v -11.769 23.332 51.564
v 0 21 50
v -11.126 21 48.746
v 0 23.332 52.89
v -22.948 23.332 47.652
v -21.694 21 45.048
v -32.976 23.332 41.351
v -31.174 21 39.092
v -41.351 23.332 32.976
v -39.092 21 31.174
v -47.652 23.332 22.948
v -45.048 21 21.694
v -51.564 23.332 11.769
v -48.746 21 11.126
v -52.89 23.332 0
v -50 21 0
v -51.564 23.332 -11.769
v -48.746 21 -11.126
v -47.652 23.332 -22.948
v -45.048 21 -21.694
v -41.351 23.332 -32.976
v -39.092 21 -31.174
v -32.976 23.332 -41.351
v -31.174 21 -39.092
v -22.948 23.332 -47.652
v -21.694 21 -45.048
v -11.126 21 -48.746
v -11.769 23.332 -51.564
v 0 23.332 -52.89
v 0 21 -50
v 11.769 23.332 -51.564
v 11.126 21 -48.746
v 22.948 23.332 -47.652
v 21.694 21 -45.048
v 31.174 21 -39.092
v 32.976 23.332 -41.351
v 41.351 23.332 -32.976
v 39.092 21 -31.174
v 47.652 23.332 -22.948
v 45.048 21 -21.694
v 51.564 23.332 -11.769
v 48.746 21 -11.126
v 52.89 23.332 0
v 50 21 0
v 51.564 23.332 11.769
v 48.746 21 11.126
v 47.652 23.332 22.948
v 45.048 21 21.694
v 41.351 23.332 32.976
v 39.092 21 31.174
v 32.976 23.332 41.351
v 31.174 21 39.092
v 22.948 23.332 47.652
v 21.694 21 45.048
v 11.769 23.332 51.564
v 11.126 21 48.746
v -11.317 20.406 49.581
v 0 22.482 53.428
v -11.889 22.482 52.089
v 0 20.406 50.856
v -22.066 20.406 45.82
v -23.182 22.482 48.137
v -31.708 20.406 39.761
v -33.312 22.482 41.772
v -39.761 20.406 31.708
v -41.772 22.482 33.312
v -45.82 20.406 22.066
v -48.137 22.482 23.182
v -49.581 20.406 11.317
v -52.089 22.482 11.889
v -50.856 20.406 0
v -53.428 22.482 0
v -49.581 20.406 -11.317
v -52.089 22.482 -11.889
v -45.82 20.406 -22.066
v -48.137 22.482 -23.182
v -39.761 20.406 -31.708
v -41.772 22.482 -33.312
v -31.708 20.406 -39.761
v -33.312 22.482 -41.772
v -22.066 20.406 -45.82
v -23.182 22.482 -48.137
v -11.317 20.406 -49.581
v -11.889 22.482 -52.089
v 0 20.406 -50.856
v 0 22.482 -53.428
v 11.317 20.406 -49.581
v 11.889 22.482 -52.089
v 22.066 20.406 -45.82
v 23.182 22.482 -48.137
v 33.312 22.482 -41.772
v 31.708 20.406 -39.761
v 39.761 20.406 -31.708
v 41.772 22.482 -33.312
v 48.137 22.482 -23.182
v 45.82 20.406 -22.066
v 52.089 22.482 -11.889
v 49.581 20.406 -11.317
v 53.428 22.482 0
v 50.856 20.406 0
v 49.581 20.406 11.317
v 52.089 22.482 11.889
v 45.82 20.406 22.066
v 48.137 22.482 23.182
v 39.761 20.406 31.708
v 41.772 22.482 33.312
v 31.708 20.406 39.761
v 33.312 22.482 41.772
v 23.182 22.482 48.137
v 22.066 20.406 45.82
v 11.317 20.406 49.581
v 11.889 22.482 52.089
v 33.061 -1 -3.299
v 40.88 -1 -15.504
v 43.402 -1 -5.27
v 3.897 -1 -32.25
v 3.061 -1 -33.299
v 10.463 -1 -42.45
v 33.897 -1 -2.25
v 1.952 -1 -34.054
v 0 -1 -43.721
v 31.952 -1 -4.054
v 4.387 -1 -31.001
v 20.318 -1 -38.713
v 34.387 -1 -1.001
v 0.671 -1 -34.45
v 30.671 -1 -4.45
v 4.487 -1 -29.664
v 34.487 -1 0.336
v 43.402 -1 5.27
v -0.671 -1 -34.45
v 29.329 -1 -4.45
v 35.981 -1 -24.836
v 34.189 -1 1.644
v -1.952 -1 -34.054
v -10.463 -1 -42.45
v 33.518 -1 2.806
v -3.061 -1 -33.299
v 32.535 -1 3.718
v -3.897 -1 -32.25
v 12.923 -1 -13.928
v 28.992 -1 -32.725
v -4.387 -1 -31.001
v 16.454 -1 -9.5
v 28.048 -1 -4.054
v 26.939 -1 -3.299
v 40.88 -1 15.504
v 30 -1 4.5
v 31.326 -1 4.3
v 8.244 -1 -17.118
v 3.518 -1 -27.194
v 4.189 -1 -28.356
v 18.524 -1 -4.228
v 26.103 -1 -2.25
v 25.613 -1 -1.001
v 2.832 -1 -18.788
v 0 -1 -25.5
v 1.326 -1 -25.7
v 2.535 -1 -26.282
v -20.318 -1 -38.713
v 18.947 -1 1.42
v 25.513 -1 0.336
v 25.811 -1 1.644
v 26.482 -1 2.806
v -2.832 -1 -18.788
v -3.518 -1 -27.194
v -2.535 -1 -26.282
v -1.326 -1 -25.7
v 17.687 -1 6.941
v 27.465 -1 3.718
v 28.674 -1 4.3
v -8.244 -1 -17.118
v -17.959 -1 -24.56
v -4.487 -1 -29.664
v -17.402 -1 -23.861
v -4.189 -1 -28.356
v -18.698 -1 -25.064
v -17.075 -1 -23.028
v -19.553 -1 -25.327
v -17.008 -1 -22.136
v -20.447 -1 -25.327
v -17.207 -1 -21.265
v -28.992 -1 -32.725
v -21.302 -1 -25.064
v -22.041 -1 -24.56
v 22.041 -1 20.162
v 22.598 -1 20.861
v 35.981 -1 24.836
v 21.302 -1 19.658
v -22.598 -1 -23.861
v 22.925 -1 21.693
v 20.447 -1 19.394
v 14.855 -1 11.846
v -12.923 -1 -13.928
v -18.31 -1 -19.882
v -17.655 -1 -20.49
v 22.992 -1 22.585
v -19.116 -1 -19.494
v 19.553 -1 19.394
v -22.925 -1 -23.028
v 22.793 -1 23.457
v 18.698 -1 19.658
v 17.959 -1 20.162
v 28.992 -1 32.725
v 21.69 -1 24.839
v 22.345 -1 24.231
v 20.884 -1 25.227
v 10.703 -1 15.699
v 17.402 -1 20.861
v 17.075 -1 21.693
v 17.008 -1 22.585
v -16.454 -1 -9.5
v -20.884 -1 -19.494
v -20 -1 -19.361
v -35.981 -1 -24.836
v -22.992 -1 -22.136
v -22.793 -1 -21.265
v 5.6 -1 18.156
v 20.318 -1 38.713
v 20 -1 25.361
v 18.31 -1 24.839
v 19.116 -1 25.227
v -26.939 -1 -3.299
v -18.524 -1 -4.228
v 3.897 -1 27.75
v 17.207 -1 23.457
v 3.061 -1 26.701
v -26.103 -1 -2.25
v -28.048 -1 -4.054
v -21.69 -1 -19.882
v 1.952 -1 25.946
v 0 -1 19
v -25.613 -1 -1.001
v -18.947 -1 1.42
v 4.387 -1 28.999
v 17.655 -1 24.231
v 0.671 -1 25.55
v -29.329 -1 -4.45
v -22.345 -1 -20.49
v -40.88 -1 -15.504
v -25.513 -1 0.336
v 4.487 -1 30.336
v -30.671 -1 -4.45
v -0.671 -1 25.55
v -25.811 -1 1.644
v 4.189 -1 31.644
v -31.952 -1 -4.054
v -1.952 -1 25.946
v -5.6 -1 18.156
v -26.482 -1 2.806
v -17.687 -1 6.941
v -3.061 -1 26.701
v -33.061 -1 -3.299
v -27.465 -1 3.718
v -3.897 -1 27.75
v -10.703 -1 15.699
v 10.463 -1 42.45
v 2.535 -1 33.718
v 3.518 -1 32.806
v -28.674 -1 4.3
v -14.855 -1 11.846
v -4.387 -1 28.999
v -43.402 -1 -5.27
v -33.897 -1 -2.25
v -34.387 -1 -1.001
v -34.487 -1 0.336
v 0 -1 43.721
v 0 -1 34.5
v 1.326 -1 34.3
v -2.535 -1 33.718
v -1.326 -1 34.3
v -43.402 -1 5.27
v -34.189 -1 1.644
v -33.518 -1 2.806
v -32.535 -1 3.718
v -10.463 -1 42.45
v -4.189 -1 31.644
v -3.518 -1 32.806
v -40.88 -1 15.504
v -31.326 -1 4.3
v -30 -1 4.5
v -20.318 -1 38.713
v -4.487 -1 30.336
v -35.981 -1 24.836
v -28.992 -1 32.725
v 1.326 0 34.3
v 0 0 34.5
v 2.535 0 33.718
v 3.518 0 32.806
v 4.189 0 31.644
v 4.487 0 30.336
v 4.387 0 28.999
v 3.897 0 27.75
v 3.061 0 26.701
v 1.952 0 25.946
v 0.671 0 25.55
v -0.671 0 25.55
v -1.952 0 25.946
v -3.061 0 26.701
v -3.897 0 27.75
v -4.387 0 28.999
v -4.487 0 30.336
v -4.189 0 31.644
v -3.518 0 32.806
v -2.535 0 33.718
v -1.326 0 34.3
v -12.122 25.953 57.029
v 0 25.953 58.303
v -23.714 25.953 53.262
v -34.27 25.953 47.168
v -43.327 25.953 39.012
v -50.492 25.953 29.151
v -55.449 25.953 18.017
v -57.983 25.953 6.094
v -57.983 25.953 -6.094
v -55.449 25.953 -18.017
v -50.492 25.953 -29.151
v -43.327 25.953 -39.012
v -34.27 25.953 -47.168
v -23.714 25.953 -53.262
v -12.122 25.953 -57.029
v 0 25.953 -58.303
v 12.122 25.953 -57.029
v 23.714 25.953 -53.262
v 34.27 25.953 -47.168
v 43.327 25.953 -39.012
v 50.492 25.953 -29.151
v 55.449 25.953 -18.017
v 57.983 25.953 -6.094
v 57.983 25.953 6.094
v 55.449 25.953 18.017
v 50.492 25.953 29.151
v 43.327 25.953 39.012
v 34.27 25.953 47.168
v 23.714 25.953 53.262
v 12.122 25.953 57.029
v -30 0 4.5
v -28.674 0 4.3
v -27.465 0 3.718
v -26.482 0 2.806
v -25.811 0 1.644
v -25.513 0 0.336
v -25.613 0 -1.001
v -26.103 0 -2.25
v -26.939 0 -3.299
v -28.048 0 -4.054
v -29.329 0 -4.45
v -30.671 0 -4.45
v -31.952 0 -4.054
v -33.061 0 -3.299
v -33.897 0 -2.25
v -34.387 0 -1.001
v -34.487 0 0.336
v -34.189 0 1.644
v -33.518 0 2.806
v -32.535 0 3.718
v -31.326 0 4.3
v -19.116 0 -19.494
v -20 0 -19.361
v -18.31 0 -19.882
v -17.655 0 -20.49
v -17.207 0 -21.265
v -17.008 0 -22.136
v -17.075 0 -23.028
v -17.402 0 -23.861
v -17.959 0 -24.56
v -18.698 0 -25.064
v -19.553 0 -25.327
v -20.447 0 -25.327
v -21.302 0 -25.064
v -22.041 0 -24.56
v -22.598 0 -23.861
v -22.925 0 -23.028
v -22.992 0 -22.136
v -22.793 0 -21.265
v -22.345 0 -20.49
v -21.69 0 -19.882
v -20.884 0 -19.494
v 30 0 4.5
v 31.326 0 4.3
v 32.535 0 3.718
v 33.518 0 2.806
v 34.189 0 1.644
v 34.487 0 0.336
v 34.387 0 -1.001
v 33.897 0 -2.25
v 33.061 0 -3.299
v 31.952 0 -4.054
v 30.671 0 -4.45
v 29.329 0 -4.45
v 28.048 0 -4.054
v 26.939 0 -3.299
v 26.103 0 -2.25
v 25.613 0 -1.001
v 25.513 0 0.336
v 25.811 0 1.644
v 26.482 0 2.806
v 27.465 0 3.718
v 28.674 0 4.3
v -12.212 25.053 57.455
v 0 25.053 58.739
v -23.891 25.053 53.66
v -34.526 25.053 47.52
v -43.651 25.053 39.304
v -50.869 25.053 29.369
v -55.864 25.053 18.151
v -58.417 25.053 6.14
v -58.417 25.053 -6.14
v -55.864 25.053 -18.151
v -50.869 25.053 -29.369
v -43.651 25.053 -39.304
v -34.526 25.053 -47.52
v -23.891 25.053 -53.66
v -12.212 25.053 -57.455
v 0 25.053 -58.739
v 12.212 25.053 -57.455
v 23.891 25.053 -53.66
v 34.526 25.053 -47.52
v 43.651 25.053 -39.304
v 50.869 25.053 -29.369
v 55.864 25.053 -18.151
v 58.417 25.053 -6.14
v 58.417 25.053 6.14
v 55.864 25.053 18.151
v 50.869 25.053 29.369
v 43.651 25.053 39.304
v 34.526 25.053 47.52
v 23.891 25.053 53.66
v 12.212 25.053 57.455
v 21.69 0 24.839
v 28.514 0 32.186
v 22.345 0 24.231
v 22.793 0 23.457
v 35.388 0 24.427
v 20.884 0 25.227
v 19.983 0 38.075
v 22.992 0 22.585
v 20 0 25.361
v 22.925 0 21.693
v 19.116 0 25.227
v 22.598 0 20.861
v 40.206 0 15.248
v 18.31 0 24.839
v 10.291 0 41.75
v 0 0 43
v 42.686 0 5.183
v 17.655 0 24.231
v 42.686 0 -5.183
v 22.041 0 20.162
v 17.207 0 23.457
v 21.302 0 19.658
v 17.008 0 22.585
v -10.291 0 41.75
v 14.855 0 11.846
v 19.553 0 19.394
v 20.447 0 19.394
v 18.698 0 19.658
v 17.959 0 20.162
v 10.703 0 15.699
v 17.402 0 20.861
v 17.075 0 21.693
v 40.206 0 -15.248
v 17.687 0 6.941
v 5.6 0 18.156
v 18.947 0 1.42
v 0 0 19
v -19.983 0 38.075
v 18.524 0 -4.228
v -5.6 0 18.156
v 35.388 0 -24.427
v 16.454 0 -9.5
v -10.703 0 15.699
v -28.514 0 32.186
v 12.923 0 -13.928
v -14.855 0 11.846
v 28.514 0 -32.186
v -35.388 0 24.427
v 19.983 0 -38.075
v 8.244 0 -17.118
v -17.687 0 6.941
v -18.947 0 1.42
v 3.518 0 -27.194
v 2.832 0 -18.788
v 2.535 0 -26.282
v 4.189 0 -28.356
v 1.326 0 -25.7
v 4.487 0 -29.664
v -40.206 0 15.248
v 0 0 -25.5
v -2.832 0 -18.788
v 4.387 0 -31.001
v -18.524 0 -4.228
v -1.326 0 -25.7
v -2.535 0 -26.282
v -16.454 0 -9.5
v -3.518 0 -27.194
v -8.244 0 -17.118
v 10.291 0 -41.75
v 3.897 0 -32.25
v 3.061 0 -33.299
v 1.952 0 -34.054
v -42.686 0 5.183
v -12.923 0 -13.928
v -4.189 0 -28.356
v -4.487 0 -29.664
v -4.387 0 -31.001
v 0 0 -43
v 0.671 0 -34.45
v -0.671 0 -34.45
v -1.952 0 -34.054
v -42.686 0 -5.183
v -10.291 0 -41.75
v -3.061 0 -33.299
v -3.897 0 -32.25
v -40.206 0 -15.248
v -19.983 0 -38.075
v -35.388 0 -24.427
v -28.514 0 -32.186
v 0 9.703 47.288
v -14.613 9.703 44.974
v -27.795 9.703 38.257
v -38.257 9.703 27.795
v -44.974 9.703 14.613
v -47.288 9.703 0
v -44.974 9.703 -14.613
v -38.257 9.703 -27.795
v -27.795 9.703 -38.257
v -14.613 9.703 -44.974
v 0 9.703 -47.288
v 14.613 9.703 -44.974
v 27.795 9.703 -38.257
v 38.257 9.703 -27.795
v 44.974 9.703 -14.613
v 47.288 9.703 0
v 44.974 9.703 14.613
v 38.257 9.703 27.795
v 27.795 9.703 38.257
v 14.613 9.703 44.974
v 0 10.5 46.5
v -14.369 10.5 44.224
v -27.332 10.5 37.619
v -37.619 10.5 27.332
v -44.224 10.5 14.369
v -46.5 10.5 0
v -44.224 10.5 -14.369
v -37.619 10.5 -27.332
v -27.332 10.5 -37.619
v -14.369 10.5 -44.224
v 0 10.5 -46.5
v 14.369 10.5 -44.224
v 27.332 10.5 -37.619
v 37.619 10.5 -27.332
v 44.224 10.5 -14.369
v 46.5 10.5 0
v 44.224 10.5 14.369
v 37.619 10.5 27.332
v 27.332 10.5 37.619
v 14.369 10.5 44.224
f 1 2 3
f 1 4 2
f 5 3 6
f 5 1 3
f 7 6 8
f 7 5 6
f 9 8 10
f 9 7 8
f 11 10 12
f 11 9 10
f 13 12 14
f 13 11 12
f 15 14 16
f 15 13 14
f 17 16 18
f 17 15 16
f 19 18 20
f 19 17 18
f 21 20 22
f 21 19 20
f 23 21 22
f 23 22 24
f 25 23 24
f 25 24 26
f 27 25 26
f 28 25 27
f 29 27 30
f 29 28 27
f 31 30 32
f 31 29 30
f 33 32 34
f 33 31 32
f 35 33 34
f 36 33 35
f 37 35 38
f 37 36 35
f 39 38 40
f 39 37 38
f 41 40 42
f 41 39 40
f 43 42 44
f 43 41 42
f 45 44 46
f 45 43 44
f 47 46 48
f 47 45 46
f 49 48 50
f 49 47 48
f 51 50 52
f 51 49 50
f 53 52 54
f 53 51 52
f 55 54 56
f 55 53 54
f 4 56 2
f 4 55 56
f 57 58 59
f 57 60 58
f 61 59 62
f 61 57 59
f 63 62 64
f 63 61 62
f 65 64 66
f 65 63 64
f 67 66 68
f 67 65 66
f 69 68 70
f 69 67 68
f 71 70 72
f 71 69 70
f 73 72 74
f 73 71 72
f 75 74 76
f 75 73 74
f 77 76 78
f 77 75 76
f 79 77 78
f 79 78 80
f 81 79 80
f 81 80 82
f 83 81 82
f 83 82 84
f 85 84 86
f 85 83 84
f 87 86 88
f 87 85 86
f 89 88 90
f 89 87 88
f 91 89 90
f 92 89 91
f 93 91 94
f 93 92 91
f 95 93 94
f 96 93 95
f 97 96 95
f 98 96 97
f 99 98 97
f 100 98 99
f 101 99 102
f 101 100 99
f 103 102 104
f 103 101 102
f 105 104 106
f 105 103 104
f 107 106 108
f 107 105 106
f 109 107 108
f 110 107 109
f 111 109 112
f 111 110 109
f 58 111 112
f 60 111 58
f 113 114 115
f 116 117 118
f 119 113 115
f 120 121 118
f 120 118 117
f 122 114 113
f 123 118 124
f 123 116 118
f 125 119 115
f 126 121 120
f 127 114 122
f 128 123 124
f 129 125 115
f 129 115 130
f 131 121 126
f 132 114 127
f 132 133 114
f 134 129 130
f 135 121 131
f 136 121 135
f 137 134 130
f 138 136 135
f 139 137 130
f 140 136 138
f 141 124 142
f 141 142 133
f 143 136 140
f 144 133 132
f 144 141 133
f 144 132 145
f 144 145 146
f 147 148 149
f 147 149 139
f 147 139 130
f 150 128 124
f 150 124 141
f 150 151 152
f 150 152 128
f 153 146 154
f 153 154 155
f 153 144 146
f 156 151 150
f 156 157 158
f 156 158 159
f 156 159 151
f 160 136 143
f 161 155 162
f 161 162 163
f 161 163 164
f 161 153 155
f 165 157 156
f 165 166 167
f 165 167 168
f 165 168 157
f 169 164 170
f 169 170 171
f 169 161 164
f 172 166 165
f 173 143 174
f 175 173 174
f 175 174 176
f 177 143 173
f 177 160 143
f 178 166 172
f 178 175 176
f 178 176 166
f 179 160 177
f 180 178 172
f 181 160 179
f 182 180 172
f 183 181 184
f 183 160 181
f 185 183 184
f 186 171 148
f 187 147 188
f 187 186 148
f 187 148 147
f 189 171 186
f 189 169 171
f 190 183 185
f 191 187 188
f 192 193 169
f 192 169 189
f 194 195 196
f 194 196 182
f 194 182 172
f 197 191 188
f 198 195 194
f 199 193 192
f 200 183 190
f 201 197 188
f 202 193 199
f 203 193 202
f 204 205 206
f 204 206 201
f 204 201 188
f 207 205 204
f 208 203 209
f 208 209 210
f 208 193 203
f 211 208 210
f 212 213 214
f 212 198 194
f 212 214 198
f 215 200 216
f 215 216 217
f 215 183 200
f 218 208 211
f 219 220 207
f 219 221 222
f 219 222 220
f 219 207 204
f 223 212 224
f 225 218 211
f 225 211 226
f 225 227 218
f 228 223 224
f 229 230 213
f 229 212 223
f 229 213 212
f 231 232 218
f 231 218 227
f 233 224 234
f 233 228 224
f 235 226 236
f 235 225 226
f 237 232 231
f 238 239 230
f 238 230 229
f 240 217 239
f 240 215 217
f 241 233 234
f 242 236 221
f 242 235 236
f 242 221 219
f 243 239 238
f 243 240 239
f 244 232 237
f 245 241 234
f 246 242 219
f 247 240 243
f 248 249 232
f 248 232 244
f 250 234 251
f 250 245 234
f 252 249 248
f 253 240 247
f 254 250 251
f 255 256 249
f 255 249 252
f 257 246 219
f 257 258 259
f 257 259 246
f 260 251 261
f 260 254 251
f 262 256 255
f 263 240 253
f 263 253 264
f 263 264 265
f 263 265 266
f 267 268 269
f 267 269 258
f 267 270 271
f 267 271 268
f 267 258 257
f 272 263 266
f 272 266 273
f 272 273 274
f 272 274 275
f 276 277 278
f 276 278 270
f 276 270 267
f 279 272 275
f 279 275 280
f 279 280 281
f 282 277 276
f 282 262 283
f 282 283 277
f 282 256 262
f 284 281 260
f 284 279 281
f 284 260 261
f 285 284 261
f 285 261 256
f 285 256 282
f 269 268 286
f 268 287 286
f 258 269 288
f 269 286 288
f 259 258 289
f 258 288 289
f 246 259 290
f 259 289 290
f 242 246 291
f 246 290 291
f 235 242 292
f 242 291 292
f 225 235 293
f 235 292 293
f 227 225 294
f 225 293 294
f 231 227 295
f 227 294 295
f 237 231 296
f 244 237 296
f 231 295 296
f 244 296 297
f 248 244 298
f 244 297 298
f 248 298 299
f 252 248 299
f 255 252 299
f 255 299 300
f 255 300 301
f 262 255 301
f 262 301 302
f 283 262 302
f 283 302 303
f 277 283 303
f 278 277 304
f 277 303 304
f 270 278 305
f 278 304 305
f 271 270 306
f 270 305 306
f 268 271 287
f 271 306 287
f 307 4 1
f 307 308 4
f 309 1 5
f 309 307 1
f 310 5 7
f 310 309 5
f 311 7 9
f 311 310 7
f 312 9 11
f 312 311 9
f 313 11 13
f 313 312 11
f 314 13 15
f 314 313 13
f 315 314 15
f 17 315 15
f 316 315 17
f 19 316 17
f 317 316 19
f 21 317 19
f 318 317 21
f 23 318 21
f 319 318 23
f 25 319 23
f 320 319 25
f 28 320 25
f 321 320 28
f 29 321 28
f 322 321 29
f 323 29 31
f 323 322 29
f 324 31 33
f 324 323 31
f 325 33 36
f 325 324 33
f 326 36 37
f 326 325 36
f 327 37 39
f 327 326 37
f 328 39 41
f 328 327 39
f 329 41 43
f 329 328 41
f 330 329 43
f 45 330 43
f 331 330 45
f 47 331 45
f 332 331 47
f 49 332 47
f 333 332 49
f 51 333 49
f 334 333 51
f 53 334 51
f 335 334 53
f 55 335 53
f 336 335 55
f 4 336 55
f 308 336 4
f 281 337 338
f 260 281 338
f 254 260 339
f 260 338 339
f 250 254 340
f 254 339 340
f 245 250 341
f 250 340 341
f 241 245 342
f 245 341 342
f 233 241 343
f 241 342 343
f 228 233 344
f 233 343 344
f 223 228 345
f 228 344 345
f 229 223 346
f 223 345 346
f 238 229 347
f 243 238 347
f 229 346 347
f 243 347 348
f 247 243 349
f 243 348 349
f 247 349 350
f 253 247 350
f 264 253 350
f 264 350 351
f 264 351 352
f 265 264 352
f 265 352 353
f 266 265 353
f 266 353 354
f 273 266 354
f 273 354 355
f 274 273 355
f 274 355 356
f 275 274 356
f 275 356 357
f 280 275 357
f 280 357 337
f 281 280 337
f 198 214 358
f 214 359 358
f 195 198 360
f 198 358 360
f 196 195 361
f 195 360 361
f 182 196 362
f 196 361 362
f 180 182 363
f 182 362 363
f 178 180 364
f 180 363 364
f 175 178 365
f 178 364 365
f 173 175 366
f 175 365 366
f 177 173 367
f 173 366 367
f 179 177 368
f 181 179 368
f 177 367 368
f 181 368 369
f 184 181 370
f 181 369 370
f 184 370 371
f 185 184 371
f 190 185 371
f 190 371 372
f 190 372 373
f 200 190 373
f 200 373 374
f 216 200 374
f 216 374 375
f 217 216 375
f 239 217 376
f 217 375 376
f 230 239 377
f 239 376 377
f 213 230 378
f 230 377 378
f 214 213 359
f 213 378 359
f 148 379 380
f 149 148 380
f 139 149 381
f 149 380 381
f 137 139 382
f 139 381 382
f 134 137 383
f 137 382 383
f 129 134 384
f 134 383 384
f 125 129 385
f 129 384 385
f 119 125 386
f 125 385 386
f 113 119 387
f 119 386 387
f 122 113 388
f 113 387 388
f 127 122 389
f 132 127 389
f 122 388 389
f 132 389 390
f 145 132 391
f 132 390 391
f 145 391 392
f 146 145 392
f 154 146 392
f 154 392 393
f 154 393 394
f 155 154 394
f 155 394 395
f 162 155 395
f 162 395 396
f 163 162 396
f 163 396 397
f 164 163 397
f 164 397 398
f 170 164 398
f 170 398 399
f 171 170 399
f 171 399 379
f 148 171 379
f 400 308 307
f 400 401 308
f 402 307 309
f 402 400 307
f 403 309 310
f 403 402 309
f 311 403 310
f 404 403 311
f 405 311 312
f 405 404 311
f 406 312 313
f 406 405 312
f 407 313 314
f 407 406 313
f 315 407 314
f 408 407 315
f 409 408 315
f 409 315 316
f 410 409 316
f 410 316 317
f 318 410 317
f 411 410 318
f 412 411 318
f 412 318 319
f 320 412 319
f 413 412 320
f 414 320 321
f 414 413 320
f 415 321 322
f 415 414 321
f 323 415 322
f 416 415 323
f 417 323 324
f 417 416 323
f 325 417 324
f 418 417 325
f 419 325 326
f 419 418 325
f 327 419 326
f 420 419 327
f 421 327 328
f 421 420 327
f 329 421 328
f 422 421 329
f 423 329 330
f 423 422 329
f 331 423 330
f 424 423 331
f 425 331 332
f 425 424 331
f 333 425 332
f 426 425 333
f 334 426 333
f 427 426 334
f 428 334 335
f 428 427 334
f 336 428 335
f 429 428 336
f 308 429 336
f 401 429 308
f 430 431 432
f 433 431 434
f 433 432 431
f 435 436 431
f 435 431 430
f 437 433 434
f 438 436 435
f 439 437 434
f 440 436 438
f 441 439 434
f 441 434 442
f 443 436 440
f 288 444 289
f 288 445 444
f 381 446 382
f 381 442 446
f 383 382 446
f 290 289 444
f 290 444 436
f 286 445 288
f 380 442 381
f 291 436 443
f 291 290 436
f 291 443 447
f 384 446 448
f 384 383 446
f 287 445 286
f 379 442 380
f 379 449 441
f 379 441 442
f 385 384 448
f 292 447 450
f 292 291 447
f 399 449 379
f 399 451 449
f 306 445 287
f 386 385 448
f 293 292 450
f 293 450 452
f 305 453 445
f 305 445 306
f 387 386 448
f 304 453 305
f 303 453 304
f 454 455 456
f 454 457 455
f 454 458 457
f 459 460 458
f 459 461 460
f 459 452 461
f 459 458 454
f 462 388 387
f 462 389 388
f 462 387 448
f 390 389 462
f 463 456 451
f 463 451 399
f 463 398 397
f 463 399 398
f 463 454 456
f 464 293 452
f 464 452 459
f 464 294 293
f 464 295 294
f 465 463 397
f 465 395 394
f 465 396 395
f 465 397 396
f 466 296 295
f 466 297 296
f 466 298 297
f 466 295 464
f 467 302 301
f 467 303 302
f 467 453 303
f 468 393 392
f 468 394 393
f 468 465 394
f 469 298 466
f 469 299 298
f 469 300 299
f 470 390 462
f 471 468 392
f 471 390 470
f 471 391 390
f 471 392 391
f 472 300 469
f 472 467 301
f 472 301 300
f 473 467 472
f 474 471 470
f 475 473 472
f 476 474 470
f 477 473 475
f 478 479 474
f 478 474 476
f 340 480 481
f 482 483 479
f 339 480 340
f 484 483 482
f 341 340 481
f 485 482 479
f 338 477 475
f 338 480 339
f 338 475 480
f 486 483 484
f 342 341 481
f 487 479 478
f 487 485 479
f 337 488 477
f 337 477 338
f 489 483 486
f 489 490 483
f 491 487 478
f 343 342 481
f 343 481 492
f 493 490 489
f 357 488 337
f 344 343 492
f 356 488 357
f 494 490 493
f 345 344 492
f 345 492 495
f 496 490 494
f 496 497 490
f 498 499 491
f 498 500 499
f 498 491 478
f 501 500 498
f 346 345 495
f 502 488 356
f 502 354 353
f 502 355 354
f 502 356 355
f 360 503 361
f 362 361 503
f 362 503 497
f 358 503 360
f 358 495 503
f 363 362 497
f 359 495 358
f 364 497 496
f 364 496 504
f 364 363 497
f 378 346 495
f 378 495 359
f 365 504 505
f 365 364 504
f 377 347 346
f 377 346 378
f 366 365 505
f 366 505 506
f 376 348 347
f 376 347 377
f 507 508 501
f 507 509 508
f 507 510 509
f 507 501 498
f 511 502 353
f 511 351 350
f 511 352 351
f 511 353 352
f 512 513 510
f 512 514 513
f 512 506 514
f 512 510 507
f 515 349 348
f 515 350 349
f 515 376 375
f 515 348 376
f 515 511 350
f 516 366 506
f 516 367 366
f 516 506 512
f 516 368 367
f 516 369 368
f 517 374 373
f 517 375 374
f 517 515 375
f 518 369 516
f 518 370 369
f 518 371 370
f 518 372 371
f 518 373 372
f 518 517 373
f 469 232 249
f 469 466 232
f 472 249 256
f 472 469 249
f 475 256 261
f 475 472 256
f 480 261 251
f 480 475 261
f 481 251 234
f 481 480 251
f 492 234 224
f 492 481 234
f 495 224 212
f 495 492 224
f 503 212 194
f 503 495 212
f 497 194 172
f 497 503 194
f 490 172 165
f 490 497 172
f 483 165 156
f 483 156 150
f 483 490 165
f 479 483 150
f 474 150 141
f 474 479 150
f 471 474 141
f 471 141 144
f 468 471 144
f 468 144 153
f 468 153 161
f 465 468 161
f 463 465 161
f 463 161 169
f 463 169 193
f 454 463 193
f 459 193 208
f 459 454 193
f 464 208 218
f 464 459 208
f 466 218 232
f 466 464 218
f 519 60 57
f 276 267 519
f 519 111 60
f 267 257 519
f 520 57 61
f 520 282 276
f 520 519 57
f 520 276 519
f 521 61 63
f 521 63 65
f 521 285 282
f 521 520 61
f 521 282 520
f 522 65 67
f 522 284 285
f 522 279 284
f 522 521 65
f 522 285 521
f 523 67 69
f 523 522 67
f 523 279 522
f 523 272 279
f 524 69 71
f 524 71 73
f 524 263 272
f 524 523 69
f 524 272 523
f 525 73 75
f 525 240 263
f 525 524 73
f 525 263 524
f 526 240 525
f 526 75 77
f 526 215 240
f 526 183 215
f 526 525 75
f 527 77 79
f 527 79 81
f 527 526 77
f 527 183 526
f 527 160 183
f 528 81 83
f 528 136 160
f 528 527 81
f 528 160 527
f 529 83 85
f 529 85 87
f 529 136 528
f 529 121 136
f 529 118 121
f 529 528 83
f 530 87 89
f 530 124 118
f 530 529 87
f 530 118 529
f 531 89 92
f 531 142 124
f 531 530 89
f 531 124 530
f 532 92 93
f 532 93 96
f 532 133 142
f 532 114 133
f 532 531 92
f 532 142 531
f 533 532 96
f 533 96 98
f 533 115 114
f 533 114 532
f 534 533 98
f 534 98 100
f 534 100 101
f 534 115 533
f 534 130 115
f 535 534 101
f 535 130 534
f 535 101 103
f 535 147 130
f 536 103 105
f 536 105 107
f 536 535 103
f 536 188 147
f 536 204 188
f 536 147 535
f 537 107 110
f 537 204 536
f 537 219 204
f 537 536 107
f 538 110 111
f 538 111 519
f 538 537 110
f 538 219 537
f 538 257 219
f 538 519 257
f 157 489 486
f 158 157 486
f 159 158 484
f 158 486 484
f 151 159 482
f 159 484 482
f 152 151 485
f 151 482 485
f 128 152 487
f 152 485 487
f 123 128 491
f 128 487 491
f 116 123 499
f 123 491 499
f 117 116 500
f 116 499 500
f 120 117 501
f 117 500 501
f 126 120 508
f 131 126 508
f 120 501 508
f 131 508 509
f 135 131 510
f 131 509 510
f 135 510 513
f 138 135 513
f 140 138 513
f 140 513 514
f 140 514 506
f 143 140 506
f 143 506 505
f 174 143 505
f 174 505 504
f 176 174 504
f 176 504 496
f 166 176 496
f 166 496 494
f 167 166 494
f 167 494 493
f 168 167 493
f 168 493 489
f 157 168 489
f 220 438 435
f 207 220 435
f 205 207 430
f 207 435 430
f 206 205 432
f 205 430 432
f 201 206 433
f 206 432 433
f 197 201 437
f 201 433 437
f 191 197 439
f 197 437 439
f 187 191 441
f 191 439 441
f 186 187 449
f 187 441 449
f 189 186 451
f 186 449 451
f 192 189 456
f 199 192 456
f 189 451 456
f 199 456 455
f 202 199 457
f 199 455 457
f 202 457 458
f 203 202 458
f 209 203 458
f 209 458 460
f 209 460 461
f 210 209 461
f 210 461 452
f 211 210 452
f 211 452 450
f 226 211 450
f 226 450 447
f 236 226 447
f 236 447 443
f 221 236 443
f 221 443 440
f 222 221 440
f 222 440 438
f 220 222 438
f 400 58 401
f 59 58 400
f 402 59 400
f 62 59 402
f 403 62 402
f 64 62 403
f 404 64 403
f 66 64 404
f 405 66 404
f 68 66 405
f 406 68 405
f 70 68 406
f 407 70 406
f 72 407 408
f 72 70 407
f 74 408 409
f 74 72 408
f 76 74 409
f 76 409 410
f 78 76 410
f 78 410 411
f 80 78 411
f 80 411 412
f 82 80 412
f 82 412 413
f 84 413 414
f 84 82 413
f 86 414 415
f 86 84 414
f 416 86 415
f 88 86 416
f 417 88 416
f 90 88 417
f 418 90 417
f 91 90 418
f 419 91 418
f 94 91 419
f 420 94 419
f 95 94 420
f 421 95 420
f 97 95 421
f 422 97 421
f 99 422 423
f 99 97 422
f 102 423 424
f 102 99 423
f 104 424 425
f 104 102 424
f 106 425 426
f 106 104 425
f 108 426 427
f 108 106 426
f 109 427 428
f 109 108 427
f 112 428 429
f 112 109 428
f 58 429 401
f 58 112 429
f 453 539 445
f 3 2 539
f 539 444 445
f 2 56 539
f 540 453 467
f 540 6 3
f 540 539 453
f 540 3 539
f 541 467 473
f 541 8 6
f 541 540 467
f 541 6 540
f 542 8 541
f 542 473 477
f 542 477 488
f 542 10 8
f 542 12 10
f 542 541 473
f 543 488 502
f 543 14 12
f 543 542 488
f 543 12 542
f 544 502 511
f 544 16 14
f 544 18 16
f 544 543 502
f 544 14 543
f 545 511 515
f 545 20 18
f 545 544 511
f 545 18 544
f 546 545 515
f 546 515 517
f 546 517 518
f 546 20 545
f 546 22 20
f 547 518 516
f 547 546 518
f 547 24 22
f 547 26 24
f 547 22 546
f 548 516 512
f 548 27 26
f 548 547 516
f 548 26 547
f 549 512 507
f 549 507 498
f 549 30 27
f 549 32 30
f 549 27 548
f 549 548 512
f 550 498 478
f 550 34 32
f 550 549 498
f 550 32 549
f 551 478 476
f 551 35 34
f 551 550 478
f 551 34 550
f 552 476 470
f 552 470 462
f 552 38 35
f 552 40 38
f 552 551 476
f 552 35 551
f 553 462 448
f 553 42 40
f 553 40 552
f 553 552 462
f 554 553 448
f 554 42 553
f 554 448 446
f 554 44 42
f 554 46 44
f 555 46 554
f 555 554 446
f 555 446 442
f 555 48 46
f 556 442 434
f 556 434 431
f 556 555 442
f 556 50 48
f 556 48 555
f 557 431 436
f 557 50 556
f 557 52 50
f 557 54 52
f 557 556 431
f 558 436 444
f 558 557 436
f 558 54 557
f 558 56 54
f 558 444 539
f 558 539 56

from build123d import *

# Parameters (mm, degrees)
SKETCH_2_R          = 4.5
CUT_EXTRUDE_1_DEPTH = 40
SKETCH_3_R          = 3
CUT_EXTRUDE_2_DEPTH = 5


with BuildPart() as part:
    # Эскиз1 → Повернуть-Тонкостенный1 (revolve)
    with BuildSketch(Plane.XY, mode=Mode.PRIVATE) as revolve_1_sk:
        Polygon((19, 0), (43, 0), (50, 21), (52.889577147, 23.332201276), (58.302767501, 25.953006302), (58.738533119, 25.052946123), (53.42847461, 22.482072549), (50.856038751, 20.405838593), (43.72075922, -1), (19, -1), align=None)
    revolve(revolve_1_sk.sketch.rotate(Axis((0, 0, 0), (0, -1, 0)), 90), axis=Axis((0, 0, 0), (0, -1, 0)))

    # Эскиз2 → Вытянуть1 (cut, symmetric)
    with BuildSketch(Plane(origin=(0, 0, 0), x_dir=(1, 0, 0), z_dir=(0, 1, 0))):
        with Locations(Location((30, 0, 0), (0, 0, 270))):
            Circle(SKETCH_2_R)
        with Locations(Location((-30, 0, 0), (0, 0, 270))):
            Circle(SKETCH_2_R)
        with Locations(Location((0, 30, 0), (0, 0, 270))):
            Circle(SKETCH_2_R)
        with Locations(Location((0, -30, 0), (0, 0, 270))):
            Circle(SKETCH_2_R)
    extrude(amount=CUT_EXTRUDE_1_DEPTH, both=True, mode=Mode.SUBTRACT)

    # Эскиз3 → Вытянуть2 (cut, symmetric)
    with BuildSketch(Plane(origin=(0, 0, 0), x_dir=(1, 0, 0), z_dir=(0, 1, 0))):
        with Locations(Location((20, -22.360679775, 0), (0, 0, 270))):
            Circle(SKETCH_3_R)
        with Locations(Location((-20, 22.360679775, 0), (0, 0, 270))):
            Circle(SKETCH_3_R)
    extrude(amount=CUT_EXTRUDE_2_DEPTH, both=True, mode=Mode.SUBTRACT)


solid = part.part
